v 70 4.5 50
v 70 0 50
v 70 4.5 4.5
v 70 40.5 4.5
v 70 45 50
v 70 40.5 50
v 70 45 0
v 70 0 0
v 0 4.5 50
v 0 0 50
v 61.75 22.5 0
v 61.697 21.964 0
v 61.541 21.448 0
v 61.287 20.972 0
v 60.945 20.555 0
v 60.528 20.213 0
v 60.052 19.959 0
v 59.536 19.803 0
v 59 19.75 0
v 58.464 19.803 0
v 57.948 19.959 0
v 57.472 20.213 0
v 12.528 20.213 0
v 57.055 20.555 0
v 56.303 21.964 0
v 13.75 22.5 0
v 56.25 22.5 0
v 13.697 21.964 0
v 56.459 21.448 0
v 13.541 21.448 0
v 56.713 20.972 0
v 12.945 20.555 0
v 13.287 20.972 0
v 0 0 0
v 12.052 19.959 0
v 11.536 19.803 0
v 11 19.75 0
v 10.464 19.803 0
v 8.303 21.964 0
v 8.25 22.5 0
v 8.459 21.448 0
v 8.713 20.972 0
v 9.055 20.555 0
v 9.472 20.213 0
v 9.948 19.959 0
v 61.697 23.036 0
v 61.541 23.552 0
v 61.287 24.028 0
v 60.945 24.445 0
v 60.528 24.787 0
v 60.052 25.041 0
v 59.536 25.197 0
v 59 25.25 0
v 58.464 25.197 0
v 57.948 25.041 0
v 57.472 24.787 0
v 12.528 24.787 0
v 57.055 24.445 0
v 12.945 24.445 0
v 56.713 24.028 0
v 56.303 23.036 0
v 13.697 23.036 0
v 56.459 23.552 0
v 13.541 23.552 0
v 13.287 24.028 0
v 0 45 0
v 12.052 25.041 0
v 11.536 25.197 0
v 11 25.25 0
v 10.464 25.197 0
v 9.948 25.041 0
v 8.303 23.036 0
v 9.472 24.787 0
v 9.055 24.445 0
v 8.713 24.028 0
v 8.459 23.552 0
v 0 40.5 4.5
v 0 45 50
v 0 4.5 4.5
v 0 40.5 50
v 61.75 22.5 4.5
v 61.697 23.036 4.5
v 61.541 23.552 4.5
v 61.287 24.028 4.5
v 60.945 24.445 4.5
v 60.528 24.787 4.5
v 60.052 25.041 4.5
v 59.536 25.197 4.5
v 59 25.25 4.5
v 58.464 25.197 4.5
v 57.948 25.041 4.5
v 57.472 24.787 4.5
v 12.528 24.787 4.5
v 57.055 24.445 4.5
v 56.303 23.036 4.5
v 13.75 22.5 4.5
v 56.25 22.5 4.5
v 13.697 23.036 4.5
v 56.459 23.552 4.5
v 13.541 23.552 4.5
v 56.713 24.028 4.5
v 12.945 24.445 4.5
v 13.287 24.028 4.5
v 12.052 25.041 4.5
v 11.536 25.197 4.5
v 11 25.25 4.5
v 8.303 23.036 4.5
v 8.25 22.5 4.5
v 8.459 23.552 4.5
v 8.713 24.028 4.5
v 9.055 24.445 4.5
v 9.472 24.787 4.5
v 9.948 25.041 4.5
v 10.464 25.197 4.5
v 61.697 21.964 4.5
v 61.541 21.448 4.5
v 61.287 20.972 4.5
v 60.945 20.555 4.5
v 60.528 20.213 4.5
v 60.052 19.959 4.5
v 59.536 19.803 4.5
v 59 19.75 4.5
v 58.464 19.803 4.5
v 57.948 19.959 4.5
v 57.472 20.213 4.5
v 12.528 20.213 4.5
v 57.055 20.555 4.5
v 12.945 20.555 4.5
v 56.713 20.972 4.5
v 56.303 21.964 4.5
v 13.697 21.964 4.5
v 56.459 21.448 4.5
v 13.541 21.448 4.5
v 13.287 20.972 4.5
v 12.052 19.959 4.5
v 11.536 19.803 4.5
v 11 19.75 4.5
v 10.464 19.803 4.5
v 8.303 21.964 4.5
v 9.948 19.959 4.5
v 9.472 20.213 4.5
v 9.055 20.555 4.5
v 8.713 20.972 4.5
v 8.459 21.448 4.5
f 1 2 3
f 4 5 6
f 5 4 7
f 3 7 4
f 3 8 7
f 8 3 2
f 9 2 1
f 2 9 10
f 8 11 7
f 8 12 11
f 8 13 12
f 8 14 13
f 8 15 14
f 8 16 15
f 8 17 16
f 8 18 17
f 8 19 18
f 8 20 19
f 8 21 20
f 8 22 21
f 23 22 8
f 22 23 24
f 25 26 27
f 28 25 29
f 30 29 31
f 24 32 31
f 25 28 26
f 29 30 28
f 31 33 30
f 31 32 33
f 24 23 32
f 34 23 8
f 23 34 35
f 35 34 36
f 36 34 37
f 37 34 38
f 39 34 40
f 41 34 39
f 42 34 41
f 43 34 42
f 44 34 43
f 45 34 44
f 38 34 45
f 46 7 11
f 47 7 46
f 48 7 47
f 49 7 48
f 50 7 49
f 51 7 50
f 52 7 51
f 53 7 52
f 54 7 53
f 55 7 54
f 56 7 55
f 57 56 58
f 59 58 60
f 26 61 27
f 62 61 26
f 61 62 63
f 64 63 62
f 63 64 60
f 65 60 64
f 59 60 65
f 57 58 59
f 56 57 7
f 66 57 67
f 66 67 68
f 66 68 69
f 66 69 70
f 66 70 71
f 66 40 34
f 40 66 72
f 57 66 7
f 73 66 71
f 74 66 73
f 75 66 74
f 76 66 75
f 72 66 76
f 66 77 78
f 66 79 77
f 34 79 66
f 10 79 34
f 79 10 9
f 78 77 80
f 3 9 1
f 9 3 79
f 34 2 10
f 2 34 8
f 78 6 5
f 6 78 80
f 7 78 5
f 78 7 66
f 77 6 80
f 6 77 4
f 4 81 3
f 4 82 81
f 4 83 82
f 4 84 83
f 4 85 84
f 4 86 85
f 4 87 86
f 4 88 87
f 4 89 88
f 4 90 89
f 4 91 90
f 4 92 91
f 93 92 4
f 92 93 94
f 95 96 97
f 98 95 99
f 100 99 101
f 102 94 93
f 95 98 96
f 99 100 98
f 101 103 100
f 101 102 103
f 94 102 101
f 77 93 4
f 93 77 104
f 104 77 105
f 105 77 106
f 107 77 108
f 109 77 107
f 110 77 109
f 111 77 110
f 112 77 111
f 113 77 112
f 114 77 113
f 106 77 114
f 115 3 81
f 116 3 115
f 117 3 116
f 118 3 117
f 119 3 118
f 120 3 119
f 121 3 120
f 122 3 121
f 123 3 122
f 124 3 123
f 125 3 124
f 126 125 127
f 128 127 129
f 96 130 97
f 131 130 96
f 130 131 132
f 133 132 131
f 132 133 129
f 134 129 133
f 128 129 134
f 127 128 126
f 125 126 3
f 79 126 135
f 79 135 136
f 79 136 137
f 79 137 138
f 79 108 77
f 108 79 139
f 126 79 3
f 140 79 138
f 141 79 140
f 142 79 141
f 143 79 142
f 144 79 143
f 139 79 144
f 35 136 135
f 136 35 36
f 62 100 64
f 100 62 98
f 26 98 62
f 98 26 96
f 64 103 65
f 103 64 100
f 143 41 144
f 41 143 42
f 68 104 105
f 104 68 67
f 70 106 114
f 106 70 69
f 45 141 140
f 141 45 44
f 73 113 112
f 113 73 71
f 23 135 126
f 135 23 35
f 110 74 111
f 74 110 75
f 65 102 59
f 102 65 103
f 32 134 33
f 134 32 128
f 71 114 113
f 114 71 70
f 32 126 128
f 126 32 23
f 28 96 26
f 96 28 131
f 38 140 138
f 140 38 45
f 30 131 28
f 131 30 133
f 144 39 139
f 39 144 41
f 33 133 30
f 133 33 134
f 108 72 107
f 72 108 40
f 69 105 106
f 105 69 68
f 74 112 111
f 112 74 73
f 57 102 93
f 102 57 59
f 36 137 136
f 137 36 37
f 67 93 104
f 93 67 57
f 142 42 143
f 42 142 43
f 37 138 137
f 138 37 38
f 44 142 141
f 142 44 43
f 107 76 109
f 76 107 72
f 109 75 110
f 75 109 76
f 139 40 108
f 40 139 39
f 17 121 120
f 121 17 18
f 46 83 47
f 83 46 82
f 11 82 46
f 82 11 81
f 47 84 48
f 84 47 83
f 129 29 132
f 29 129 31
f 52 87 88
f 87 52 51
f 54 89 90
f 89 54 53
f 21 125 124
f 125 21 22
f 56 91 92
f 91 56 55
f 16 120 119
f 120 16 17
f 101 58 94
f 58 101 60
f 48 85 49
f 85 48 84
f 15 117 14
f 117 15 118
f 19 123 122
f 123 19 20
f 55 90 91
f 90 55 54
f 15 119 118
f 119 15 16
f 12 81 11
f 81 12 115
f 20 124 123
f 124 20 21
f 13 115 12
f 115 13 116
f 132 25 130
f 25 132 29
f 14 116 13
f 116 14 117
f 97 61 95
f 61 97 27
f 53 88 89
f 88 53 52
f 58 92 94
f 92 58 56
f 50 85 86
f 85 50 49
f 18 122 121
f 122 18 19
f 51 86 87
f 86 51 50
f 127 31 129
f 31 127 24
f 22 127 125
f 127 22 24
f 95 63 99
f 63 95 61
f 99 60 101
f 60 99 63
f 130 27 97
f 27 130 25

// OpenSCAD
$fn = 32;

// ----------------------------------------------------------------------
// U-bracket: 70 x 45 x 50 mm
// ----------------------------------------------------------------------

// --- parameters (mm) ---
span = 70;                // outer length, X
outer_w = 45;             // outer width, Y
wall_h = 50;              // upright height, Z
plate_t = 4.5;            // wall thickness
hole_d = 5.5;             // clearance for M5

module hole_z(px, py) {
  translate([px, py, -0.5]) cylinder(h = plate_t + 1, d = hole_d);
}
module hole_y_pz(pz) {
  /* through both uprights along Y */
  translate([0, -0.5, pz]) rotate([-90, 0, 0]) cylinder(h = outer_w + 1, d = hole_d);
}

module base() {
  cube([span, outer_w, plate_t]);
}

module uprights() {
  cube([span, plate_t, wall_h]);
  translate([0, outer_w - plate_t, 0]) cube([span, plate_t, wall_h]);
}

difference() {
  union() {
    base();
    uprights();
  }
  hole_z(11, 22.5);
  hole_z(59, 22.5);
}
